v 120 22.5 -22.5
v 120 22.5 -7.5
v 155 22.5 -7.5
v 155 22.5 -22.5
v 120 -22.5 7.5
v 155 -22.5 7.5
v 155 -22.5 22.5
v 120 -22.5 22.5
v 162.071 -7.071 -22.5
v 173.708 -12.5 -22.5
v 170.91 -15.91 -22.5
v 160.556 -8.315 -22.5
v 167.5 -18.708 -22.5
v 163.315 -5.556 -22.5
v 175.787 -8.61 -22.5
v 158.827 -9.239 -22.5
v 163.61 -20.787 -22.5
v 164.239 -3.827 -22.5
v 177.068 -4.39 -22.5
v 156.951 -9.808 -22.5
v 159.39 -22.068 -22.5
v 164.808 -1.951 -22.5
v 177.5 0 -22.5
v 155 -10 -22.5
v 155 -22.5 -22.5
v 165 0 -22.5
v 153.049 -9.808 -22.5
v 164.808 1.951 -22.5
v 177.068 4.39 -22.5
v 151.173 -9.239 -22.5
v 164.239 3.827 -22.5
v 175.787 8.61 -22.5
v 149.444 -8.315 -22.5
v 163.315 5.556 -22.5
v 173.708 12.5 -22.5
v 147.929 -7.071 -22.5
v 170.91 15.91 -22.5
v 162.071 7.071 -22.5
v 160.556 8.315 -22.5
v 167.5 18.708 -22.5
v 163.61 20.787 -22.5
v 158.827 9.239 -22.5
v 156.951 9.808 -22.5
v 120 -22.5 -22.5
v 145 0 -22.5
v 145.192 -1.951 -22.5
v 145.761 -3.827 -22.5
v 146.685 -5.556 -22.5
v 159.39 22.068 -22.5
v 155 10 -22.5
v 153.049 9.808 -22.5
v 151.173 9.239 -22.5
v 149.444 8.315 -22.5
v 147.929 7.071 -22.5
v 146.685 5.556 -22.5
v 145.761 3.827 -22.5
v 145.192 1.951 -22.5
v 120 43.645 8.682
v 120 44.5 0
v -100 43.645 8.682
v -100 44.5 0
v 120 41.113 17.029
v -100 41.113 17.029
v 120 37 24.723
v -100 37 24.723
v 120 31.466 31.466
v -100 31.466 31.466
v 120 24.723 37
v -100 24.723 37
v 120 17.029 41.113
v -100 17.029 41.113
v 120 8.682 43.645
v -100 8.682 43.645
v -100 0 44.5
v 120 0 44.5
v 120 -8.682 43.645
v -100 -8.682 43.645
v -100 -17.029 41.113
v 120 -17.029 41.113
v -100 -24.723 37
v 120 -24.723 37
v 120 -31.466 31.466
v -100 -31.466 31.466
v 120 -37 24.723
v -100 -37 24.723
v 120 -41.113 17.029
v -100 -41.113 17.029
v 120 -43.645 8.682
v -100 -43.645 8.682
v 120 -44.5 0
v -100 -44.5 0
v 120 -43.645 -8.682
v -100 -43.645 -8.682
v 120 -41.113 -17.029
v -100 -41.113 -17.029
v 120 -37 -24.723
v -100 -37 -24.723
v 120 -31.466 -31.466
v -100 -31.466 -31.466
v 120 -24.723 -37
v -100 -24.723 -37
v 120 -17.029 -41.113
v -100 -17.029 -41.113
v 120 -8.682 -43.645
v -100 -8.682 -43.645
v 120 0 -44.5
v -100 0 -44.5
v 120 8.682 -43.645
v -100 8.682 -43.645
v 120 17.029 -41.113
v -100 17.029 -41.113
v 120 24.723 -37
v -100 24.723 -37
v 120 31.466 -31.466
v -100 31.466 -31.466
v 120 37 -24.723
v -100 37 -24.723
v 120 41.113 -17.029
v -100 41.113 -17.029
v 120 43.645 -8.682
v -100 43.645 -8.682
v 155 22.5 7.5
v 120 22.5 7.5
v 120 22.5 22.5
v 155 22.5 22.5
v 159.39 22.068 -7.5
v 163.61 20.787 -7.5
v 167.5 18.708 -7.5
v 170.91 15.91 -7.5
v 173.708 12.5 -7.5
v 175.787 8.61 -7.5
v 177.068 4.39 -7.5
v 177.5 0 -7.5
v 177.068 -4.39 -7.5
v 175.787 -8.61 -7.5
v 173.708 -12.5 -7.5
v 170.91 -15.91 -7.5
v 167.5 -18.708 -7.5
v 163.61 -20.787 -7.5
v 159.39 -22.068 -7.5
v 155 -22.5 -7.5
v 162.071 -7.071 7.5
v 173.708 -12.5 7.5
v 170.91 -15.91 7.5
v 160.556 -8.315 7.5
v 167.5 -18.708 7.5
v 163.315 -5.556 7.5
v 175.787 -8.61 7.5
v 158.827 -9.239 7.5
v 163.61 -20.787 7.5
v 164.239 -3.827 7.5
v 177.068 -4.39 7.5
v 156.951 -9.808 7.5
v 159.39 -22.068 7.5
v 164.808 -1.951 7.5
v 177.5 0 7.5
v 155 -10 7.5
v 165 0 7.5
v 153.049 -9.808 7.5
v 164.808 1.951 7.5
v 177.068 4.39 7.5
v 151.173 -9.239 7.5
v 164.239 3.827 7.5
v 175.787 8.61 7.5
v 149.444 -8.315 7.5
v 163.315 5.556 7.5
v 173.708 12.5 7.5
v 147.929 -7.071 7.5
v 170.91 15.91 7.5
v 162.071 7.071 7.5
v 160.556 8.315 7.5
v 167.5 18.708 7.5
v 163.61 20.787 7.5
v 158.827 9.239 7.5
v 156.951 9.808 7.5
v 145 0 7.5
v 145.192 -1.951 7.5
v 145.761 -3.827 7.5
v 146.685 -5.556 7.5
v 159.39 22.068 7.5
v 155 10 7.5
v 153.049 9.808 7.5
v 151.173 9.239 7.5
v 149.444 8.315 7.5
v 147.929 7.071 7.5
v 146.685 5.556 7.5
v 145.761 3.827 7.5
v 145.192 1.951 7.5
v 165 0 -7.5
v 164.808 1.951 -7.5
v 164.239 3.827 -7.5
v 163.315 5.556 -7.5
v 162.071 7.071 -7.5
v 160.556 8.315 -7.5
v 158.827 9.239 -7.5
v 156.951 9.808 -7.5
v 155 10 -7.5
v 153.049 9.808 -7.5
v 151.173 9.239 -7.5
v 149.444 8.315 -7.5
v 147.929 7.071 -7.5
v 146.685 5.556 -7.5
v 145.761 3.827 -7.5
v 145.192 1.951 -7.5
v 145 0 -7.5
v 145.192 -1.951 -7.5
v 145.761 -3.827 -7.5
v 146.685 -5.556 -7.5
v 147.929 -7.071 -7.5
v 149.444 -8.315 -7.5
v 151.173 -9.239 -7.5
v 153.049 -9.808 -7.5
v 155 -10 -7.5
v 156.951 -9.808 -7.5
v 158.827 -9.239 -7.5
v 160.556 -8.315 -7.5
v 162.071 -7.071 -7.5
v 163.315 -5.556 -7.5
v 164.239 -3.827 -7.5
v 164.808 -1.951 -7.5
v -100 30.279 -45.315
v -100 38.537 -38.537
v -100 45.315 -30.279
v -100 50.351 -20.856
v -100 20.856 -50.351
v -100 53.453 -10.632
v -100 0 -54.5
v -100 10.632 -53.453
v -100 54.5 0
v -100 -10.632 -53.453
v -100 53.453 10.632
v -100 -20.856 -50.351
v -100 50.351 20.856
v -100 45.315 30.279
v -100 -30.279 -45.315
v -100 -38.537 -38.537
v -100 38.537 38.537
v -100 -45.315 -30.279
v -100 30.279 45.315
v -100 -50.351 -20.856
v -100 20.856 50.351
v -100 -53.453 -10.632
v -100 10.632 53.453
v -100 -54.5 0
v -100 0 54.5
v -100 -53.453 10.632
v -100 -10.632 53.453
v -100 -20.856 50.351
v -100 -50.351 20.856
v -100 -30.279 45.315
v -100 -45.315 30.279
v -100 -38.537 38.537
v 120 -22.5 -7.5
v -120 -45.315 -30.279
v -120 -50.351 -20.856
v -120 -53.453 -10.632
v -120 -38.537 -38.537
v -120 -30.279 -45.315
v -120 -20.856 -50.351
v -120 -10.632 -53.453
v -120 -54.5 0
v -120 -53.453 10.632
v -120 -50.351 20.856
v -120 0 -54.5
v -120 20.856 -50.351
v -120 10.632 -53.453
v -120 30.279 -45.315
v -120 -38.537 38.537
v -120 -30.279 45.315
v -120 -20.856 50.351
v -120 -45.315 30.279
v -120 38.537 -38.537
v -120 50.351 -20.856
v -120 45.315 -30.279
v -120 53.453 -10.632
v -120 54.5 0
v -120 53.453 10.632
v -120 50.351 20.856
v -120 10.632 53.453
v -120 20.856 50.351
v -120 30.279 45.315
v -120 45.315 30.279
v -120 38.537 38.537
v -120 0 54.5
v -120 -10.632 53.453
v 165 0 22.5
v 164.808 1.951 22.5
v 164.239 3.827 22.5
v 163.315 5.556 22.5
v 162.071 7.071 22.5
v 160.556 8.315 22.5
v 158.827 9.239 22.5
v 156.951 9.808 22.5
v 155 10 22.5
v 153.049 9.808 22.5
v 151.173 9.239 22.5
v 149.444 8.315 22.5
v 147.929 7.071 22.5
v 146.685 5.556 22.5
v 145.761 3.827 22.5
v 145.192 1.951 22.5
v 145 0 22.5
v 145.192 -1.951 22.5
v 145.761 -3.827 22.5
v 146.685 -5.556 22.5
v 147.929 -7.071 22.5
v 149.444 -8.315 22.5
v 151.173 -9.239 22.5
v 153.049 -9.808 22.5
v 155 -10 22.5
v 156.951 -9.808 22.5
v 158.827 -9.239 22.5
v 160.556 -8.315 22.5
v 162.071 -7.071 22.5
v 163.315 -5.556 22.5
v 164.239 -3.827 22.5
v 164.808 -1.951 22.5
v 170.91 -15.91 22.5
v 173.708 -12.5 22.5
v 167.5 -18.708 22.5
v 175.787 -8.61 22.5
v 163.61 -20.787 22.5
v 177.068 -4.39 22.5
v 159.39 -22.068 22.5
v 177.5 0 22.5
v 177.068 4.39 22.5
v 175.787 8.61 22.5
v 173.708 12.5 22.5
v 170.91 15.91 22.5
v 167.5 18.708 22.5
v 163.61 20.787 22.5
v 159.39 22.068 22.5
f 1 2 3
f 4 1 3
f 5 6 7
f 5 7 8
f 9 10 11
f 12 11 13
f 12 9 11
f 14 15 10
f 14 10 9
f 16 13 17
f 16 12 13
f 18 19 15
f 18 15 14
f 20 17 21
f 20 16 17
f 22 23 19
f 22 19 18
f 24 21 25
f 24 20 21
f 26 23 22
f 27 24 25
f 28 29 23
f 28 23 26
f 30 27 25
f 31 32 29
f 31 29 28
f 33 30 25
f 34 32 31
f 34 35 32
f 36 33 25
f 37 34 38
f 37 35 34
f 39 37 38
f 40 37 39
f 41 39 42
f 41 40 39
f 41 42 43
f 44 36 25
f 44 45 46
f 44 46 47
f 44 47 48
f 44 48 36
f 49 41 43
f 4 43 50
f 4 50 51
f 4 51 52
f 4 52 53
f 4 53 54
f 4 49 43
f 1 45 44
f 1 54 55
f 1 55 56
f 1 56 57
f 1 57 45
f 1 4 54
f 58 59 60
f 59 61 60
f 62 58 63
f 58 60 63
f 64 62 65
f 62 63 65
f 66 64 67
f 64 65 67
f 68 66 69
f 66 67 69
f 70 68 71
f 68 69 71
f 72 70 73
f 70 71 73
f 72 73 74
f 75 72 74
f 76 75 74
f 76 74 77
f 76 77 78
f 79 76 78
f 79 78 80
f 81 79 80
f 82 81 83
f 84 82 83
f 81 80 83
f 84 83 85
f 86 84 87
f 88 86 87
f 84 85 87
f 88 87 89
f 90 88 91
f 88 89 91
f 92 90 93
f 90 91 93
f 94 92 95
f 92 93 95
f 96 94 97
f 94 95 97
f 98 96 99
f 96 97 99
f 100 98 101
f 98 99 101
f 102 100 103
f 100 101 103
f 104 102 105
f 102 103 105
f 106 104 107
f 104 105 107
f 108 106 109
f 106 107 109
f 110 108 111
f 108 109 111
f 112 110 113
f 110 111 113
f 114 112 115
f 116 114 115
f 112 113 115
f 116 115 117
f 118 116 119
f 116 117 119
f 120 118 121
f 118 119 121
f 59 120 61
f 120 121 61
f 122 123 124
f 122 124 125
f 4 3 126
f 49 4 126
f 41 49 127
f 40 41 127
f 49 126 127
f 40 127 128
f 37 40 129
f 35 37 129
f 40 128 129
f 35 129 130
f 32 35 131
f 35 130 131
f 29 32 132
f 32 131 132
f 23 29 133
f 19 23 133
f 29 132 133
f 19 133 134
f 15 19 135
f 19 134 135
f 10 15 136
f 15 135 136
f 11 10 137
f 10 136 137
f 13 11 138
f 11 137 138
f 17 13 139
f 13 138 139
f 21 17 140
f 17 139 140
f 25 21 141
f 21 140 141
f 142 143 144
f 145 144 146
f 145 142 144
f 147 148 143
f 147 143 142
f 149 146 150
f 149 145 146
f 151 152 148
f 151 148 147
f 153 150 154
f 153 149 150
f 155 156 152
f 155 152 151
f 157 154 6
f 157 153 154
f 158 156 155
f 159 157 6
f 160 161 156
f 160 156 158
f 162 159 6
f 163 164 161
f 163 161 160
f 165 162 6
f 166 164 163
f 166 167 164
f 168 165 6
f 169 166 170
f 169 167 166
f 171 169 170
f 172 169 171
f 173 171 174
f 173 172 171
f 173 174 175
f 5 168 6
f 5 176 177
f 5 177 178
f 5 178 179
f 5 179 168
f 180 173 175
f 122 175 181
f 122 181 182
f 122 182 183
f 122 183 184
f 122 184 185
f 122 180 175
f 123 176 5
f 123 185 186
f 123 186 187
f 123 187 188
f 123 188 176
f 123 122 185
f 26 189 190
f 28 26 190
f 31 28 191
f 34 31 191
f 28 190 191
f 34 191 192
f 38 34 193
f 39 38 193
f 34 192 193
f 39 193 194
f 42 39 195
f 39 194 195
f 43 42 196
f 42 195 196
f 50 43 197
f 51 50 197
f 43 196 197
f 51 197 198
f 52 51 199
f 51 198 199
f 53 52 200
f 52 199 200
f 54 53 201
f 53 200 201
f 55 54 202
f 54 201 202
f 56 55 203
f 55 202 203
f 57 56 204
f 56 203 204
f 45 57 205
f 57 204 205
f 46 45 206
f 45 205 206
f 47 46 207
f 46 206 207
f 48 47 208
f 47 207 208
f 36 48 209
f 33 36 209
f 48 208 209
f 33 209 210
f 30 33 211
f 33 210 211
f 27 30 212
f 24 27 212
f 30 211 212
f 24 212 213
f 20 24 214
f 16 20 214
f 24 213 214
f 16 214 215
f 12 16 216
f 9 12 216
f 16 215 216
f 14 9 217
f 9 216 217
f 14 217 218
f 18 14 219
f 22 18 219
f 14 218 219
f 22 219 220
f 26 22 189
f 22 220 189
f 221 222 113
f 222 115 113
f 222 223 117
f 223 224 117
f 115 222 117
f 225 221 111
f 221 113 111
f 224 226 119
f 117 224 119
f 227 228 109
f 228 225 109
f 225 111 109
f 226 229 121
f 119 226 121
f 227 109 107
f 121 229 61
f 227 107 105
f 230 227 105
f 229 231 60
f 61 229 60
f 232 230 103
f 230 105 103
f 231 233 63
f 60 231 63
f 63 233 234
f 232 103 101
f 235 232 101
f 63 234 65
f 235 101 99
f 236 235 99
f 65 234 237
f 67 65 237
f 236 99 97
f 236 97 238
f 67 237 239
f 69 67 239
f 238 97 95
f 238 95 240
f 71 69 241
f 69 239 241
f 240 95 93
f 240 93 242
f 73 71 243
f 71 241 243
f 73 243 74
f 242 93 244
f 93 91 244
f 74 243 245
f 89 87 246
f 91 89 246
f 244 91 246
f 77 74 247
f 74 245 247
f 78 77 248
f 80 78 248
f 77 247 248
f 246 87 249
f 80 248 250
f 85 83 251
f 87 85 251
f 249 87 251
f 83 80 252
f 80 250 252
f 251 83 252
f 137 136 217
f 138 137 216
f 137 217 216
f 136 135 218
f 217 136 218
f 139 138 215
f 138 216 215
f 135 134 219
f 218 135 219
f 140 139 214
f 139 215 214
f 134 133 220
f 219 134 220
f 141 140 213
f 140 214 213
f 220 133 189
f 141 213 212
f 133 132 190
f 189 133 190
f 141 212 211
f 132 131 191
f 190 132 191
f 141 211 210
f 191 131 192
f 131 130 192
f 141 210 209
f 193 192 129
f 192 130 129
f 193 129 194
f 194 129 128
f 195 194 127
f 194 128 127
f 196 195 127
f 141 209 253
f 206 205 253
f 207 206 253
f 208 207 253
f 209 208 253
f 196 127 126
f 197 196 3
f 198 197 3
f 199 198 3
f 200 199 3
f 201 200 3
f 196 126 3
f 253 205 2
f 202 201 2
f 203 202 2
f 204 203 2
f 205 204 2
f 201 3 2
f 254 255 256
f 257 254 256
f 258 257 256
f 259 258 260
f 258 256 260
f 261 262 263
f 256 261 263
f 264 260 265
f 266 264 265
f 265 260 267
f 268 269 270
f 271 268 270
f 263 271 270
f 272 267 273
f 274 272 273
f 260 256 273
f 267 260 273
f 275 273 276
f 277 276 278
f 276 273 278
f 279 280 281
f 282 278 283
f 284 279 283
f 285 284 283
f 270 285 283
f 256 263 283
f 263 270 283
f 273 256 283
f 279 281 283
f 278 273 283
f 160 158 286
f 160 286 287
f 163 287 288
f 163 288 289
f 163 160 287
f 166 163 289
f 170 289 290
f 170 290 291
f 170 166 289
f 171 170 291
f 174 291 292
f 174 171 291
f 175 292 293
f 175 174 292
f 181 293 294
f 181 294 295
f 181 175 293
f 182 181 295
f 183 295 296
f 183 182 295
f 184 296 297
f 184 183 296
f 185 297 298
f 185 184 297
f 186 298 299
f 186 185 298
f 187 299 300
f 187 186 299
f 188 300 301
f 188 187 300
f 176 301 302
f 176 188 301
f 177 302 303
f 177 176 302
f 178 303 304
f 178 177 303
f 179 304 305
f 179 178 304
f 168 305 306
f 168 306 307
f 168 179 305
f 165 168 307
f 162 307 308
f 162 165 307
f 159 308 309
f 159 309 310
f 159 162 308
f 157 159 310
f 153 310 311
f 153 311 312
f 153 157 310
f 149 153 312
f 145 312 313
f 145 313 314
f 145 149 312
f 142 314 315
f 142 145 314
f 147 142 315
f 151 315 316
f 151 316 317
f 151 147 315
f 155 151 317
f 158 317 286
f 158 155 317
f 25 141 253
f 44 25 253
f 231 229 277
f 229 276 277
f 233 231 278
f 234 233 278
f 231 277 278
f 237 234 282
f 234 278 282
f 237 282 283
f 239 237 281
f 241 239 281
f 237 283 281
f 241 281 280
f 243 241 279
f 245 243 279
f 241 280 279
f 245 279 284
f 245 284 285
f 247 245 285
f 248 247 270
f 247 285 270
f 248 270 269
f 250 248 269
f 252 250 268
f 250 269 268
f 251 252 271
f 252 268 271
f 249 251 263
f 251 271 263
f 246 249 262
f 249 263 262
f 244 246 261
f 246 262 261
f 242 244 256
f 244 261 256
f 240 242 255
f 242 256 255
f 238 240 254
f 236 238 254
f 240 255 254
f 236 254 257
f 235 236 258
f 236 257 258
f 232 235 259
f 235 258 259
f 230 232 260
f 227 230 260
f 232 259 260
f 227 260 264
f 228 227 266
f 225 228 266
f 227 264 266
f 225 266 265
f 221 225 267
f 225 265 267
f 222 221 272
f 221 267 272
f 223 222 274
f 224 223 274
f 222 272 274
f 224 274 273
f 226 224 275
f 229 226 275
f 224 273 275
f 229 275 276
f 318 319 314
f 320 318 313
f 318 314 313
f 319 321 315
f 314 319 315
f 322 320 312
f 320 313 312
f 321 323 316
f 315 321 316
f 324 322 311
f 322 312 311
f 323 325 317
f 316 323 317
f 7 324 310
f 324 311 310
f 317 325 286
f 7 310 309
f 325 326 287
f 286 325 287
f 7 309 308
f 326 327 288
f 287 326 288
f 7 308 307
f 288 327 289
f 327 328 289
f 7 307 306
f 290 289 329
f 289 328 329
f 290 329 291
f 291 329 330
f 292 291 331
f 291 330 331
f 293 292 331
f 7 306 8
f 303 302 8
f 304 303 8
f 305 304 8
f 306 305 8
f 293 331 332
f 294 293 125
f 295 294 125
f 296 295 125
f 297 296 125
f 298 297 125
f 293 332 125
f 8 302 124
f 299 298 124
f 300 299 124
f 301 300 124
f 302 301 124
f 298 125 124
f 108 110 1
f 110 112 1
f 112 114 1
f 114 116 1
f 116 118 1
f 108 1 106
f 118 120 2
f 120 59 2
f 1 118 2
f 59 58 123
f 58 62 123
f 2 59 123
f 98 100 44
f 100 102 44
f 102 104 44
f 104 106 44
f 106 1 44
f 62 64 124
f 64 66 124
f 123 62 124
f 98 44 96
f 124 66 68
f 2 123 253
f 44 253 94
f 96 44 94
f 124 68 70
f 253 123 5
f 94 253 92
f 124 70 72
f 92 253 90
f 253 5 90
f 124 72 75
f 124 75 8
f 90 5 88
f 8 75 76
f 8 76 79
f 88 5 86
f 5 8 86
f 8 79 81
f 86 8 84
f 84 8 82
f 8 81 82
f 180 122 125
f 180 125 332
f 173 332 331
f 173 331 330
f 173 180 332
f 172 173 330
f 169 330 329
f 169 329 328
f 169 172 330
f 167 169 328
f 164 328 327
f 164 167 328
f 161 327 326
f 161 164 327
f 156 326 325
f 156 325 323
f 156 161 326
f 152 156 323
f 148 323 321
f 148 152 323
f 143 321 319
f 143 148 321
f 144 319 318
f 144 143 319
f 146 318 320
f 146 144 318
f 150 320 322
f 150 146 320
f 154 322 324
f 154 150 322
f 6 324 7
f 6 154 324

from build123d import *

# Parameters (mm, degrees)
SKETCH3_R           = 10
BOSS_EXTRUDE1_DEPTH = 15


with BuildPart() as part:
    # Sketch2 → Revolve1 (revolve)
    with BuildSketch(Plane.XY):
        Polygon((-120, 0), (120, 0), (120, 44.5), (-100, 44.5), (-100, 54.5), (-120, 54.5), align=None)
    revolve(axis=Axis((-120, 0, 0), (1, 0, 0)))

    # Sketch3 → Boss-Extrude1 (add)
    with BuildSketch(Plane.XY.offset(7.5)):
        with BuildLine():
            Line((120, 22.5), (155, 22.5))
            ThreePointArc((155, 22.5), (177.5, 0), (155, -22.5))
            Line((155, -22.5), (120, -22.5))
            Line((120, -22.5), (120, 22.5))
        make_face()
        with Locations((155, 0)):
            Circle(SKETCH3_R, mode=Mode.SUBTRACT)
    boss_extrude1 = extrude(amount=BOSS_EXTRUDE1_DEPTH)

    # Mirror1: Boss-Extrude1 across plane
    add(boss_extrude1.mirror(Plane.XY))


solid = part.part
